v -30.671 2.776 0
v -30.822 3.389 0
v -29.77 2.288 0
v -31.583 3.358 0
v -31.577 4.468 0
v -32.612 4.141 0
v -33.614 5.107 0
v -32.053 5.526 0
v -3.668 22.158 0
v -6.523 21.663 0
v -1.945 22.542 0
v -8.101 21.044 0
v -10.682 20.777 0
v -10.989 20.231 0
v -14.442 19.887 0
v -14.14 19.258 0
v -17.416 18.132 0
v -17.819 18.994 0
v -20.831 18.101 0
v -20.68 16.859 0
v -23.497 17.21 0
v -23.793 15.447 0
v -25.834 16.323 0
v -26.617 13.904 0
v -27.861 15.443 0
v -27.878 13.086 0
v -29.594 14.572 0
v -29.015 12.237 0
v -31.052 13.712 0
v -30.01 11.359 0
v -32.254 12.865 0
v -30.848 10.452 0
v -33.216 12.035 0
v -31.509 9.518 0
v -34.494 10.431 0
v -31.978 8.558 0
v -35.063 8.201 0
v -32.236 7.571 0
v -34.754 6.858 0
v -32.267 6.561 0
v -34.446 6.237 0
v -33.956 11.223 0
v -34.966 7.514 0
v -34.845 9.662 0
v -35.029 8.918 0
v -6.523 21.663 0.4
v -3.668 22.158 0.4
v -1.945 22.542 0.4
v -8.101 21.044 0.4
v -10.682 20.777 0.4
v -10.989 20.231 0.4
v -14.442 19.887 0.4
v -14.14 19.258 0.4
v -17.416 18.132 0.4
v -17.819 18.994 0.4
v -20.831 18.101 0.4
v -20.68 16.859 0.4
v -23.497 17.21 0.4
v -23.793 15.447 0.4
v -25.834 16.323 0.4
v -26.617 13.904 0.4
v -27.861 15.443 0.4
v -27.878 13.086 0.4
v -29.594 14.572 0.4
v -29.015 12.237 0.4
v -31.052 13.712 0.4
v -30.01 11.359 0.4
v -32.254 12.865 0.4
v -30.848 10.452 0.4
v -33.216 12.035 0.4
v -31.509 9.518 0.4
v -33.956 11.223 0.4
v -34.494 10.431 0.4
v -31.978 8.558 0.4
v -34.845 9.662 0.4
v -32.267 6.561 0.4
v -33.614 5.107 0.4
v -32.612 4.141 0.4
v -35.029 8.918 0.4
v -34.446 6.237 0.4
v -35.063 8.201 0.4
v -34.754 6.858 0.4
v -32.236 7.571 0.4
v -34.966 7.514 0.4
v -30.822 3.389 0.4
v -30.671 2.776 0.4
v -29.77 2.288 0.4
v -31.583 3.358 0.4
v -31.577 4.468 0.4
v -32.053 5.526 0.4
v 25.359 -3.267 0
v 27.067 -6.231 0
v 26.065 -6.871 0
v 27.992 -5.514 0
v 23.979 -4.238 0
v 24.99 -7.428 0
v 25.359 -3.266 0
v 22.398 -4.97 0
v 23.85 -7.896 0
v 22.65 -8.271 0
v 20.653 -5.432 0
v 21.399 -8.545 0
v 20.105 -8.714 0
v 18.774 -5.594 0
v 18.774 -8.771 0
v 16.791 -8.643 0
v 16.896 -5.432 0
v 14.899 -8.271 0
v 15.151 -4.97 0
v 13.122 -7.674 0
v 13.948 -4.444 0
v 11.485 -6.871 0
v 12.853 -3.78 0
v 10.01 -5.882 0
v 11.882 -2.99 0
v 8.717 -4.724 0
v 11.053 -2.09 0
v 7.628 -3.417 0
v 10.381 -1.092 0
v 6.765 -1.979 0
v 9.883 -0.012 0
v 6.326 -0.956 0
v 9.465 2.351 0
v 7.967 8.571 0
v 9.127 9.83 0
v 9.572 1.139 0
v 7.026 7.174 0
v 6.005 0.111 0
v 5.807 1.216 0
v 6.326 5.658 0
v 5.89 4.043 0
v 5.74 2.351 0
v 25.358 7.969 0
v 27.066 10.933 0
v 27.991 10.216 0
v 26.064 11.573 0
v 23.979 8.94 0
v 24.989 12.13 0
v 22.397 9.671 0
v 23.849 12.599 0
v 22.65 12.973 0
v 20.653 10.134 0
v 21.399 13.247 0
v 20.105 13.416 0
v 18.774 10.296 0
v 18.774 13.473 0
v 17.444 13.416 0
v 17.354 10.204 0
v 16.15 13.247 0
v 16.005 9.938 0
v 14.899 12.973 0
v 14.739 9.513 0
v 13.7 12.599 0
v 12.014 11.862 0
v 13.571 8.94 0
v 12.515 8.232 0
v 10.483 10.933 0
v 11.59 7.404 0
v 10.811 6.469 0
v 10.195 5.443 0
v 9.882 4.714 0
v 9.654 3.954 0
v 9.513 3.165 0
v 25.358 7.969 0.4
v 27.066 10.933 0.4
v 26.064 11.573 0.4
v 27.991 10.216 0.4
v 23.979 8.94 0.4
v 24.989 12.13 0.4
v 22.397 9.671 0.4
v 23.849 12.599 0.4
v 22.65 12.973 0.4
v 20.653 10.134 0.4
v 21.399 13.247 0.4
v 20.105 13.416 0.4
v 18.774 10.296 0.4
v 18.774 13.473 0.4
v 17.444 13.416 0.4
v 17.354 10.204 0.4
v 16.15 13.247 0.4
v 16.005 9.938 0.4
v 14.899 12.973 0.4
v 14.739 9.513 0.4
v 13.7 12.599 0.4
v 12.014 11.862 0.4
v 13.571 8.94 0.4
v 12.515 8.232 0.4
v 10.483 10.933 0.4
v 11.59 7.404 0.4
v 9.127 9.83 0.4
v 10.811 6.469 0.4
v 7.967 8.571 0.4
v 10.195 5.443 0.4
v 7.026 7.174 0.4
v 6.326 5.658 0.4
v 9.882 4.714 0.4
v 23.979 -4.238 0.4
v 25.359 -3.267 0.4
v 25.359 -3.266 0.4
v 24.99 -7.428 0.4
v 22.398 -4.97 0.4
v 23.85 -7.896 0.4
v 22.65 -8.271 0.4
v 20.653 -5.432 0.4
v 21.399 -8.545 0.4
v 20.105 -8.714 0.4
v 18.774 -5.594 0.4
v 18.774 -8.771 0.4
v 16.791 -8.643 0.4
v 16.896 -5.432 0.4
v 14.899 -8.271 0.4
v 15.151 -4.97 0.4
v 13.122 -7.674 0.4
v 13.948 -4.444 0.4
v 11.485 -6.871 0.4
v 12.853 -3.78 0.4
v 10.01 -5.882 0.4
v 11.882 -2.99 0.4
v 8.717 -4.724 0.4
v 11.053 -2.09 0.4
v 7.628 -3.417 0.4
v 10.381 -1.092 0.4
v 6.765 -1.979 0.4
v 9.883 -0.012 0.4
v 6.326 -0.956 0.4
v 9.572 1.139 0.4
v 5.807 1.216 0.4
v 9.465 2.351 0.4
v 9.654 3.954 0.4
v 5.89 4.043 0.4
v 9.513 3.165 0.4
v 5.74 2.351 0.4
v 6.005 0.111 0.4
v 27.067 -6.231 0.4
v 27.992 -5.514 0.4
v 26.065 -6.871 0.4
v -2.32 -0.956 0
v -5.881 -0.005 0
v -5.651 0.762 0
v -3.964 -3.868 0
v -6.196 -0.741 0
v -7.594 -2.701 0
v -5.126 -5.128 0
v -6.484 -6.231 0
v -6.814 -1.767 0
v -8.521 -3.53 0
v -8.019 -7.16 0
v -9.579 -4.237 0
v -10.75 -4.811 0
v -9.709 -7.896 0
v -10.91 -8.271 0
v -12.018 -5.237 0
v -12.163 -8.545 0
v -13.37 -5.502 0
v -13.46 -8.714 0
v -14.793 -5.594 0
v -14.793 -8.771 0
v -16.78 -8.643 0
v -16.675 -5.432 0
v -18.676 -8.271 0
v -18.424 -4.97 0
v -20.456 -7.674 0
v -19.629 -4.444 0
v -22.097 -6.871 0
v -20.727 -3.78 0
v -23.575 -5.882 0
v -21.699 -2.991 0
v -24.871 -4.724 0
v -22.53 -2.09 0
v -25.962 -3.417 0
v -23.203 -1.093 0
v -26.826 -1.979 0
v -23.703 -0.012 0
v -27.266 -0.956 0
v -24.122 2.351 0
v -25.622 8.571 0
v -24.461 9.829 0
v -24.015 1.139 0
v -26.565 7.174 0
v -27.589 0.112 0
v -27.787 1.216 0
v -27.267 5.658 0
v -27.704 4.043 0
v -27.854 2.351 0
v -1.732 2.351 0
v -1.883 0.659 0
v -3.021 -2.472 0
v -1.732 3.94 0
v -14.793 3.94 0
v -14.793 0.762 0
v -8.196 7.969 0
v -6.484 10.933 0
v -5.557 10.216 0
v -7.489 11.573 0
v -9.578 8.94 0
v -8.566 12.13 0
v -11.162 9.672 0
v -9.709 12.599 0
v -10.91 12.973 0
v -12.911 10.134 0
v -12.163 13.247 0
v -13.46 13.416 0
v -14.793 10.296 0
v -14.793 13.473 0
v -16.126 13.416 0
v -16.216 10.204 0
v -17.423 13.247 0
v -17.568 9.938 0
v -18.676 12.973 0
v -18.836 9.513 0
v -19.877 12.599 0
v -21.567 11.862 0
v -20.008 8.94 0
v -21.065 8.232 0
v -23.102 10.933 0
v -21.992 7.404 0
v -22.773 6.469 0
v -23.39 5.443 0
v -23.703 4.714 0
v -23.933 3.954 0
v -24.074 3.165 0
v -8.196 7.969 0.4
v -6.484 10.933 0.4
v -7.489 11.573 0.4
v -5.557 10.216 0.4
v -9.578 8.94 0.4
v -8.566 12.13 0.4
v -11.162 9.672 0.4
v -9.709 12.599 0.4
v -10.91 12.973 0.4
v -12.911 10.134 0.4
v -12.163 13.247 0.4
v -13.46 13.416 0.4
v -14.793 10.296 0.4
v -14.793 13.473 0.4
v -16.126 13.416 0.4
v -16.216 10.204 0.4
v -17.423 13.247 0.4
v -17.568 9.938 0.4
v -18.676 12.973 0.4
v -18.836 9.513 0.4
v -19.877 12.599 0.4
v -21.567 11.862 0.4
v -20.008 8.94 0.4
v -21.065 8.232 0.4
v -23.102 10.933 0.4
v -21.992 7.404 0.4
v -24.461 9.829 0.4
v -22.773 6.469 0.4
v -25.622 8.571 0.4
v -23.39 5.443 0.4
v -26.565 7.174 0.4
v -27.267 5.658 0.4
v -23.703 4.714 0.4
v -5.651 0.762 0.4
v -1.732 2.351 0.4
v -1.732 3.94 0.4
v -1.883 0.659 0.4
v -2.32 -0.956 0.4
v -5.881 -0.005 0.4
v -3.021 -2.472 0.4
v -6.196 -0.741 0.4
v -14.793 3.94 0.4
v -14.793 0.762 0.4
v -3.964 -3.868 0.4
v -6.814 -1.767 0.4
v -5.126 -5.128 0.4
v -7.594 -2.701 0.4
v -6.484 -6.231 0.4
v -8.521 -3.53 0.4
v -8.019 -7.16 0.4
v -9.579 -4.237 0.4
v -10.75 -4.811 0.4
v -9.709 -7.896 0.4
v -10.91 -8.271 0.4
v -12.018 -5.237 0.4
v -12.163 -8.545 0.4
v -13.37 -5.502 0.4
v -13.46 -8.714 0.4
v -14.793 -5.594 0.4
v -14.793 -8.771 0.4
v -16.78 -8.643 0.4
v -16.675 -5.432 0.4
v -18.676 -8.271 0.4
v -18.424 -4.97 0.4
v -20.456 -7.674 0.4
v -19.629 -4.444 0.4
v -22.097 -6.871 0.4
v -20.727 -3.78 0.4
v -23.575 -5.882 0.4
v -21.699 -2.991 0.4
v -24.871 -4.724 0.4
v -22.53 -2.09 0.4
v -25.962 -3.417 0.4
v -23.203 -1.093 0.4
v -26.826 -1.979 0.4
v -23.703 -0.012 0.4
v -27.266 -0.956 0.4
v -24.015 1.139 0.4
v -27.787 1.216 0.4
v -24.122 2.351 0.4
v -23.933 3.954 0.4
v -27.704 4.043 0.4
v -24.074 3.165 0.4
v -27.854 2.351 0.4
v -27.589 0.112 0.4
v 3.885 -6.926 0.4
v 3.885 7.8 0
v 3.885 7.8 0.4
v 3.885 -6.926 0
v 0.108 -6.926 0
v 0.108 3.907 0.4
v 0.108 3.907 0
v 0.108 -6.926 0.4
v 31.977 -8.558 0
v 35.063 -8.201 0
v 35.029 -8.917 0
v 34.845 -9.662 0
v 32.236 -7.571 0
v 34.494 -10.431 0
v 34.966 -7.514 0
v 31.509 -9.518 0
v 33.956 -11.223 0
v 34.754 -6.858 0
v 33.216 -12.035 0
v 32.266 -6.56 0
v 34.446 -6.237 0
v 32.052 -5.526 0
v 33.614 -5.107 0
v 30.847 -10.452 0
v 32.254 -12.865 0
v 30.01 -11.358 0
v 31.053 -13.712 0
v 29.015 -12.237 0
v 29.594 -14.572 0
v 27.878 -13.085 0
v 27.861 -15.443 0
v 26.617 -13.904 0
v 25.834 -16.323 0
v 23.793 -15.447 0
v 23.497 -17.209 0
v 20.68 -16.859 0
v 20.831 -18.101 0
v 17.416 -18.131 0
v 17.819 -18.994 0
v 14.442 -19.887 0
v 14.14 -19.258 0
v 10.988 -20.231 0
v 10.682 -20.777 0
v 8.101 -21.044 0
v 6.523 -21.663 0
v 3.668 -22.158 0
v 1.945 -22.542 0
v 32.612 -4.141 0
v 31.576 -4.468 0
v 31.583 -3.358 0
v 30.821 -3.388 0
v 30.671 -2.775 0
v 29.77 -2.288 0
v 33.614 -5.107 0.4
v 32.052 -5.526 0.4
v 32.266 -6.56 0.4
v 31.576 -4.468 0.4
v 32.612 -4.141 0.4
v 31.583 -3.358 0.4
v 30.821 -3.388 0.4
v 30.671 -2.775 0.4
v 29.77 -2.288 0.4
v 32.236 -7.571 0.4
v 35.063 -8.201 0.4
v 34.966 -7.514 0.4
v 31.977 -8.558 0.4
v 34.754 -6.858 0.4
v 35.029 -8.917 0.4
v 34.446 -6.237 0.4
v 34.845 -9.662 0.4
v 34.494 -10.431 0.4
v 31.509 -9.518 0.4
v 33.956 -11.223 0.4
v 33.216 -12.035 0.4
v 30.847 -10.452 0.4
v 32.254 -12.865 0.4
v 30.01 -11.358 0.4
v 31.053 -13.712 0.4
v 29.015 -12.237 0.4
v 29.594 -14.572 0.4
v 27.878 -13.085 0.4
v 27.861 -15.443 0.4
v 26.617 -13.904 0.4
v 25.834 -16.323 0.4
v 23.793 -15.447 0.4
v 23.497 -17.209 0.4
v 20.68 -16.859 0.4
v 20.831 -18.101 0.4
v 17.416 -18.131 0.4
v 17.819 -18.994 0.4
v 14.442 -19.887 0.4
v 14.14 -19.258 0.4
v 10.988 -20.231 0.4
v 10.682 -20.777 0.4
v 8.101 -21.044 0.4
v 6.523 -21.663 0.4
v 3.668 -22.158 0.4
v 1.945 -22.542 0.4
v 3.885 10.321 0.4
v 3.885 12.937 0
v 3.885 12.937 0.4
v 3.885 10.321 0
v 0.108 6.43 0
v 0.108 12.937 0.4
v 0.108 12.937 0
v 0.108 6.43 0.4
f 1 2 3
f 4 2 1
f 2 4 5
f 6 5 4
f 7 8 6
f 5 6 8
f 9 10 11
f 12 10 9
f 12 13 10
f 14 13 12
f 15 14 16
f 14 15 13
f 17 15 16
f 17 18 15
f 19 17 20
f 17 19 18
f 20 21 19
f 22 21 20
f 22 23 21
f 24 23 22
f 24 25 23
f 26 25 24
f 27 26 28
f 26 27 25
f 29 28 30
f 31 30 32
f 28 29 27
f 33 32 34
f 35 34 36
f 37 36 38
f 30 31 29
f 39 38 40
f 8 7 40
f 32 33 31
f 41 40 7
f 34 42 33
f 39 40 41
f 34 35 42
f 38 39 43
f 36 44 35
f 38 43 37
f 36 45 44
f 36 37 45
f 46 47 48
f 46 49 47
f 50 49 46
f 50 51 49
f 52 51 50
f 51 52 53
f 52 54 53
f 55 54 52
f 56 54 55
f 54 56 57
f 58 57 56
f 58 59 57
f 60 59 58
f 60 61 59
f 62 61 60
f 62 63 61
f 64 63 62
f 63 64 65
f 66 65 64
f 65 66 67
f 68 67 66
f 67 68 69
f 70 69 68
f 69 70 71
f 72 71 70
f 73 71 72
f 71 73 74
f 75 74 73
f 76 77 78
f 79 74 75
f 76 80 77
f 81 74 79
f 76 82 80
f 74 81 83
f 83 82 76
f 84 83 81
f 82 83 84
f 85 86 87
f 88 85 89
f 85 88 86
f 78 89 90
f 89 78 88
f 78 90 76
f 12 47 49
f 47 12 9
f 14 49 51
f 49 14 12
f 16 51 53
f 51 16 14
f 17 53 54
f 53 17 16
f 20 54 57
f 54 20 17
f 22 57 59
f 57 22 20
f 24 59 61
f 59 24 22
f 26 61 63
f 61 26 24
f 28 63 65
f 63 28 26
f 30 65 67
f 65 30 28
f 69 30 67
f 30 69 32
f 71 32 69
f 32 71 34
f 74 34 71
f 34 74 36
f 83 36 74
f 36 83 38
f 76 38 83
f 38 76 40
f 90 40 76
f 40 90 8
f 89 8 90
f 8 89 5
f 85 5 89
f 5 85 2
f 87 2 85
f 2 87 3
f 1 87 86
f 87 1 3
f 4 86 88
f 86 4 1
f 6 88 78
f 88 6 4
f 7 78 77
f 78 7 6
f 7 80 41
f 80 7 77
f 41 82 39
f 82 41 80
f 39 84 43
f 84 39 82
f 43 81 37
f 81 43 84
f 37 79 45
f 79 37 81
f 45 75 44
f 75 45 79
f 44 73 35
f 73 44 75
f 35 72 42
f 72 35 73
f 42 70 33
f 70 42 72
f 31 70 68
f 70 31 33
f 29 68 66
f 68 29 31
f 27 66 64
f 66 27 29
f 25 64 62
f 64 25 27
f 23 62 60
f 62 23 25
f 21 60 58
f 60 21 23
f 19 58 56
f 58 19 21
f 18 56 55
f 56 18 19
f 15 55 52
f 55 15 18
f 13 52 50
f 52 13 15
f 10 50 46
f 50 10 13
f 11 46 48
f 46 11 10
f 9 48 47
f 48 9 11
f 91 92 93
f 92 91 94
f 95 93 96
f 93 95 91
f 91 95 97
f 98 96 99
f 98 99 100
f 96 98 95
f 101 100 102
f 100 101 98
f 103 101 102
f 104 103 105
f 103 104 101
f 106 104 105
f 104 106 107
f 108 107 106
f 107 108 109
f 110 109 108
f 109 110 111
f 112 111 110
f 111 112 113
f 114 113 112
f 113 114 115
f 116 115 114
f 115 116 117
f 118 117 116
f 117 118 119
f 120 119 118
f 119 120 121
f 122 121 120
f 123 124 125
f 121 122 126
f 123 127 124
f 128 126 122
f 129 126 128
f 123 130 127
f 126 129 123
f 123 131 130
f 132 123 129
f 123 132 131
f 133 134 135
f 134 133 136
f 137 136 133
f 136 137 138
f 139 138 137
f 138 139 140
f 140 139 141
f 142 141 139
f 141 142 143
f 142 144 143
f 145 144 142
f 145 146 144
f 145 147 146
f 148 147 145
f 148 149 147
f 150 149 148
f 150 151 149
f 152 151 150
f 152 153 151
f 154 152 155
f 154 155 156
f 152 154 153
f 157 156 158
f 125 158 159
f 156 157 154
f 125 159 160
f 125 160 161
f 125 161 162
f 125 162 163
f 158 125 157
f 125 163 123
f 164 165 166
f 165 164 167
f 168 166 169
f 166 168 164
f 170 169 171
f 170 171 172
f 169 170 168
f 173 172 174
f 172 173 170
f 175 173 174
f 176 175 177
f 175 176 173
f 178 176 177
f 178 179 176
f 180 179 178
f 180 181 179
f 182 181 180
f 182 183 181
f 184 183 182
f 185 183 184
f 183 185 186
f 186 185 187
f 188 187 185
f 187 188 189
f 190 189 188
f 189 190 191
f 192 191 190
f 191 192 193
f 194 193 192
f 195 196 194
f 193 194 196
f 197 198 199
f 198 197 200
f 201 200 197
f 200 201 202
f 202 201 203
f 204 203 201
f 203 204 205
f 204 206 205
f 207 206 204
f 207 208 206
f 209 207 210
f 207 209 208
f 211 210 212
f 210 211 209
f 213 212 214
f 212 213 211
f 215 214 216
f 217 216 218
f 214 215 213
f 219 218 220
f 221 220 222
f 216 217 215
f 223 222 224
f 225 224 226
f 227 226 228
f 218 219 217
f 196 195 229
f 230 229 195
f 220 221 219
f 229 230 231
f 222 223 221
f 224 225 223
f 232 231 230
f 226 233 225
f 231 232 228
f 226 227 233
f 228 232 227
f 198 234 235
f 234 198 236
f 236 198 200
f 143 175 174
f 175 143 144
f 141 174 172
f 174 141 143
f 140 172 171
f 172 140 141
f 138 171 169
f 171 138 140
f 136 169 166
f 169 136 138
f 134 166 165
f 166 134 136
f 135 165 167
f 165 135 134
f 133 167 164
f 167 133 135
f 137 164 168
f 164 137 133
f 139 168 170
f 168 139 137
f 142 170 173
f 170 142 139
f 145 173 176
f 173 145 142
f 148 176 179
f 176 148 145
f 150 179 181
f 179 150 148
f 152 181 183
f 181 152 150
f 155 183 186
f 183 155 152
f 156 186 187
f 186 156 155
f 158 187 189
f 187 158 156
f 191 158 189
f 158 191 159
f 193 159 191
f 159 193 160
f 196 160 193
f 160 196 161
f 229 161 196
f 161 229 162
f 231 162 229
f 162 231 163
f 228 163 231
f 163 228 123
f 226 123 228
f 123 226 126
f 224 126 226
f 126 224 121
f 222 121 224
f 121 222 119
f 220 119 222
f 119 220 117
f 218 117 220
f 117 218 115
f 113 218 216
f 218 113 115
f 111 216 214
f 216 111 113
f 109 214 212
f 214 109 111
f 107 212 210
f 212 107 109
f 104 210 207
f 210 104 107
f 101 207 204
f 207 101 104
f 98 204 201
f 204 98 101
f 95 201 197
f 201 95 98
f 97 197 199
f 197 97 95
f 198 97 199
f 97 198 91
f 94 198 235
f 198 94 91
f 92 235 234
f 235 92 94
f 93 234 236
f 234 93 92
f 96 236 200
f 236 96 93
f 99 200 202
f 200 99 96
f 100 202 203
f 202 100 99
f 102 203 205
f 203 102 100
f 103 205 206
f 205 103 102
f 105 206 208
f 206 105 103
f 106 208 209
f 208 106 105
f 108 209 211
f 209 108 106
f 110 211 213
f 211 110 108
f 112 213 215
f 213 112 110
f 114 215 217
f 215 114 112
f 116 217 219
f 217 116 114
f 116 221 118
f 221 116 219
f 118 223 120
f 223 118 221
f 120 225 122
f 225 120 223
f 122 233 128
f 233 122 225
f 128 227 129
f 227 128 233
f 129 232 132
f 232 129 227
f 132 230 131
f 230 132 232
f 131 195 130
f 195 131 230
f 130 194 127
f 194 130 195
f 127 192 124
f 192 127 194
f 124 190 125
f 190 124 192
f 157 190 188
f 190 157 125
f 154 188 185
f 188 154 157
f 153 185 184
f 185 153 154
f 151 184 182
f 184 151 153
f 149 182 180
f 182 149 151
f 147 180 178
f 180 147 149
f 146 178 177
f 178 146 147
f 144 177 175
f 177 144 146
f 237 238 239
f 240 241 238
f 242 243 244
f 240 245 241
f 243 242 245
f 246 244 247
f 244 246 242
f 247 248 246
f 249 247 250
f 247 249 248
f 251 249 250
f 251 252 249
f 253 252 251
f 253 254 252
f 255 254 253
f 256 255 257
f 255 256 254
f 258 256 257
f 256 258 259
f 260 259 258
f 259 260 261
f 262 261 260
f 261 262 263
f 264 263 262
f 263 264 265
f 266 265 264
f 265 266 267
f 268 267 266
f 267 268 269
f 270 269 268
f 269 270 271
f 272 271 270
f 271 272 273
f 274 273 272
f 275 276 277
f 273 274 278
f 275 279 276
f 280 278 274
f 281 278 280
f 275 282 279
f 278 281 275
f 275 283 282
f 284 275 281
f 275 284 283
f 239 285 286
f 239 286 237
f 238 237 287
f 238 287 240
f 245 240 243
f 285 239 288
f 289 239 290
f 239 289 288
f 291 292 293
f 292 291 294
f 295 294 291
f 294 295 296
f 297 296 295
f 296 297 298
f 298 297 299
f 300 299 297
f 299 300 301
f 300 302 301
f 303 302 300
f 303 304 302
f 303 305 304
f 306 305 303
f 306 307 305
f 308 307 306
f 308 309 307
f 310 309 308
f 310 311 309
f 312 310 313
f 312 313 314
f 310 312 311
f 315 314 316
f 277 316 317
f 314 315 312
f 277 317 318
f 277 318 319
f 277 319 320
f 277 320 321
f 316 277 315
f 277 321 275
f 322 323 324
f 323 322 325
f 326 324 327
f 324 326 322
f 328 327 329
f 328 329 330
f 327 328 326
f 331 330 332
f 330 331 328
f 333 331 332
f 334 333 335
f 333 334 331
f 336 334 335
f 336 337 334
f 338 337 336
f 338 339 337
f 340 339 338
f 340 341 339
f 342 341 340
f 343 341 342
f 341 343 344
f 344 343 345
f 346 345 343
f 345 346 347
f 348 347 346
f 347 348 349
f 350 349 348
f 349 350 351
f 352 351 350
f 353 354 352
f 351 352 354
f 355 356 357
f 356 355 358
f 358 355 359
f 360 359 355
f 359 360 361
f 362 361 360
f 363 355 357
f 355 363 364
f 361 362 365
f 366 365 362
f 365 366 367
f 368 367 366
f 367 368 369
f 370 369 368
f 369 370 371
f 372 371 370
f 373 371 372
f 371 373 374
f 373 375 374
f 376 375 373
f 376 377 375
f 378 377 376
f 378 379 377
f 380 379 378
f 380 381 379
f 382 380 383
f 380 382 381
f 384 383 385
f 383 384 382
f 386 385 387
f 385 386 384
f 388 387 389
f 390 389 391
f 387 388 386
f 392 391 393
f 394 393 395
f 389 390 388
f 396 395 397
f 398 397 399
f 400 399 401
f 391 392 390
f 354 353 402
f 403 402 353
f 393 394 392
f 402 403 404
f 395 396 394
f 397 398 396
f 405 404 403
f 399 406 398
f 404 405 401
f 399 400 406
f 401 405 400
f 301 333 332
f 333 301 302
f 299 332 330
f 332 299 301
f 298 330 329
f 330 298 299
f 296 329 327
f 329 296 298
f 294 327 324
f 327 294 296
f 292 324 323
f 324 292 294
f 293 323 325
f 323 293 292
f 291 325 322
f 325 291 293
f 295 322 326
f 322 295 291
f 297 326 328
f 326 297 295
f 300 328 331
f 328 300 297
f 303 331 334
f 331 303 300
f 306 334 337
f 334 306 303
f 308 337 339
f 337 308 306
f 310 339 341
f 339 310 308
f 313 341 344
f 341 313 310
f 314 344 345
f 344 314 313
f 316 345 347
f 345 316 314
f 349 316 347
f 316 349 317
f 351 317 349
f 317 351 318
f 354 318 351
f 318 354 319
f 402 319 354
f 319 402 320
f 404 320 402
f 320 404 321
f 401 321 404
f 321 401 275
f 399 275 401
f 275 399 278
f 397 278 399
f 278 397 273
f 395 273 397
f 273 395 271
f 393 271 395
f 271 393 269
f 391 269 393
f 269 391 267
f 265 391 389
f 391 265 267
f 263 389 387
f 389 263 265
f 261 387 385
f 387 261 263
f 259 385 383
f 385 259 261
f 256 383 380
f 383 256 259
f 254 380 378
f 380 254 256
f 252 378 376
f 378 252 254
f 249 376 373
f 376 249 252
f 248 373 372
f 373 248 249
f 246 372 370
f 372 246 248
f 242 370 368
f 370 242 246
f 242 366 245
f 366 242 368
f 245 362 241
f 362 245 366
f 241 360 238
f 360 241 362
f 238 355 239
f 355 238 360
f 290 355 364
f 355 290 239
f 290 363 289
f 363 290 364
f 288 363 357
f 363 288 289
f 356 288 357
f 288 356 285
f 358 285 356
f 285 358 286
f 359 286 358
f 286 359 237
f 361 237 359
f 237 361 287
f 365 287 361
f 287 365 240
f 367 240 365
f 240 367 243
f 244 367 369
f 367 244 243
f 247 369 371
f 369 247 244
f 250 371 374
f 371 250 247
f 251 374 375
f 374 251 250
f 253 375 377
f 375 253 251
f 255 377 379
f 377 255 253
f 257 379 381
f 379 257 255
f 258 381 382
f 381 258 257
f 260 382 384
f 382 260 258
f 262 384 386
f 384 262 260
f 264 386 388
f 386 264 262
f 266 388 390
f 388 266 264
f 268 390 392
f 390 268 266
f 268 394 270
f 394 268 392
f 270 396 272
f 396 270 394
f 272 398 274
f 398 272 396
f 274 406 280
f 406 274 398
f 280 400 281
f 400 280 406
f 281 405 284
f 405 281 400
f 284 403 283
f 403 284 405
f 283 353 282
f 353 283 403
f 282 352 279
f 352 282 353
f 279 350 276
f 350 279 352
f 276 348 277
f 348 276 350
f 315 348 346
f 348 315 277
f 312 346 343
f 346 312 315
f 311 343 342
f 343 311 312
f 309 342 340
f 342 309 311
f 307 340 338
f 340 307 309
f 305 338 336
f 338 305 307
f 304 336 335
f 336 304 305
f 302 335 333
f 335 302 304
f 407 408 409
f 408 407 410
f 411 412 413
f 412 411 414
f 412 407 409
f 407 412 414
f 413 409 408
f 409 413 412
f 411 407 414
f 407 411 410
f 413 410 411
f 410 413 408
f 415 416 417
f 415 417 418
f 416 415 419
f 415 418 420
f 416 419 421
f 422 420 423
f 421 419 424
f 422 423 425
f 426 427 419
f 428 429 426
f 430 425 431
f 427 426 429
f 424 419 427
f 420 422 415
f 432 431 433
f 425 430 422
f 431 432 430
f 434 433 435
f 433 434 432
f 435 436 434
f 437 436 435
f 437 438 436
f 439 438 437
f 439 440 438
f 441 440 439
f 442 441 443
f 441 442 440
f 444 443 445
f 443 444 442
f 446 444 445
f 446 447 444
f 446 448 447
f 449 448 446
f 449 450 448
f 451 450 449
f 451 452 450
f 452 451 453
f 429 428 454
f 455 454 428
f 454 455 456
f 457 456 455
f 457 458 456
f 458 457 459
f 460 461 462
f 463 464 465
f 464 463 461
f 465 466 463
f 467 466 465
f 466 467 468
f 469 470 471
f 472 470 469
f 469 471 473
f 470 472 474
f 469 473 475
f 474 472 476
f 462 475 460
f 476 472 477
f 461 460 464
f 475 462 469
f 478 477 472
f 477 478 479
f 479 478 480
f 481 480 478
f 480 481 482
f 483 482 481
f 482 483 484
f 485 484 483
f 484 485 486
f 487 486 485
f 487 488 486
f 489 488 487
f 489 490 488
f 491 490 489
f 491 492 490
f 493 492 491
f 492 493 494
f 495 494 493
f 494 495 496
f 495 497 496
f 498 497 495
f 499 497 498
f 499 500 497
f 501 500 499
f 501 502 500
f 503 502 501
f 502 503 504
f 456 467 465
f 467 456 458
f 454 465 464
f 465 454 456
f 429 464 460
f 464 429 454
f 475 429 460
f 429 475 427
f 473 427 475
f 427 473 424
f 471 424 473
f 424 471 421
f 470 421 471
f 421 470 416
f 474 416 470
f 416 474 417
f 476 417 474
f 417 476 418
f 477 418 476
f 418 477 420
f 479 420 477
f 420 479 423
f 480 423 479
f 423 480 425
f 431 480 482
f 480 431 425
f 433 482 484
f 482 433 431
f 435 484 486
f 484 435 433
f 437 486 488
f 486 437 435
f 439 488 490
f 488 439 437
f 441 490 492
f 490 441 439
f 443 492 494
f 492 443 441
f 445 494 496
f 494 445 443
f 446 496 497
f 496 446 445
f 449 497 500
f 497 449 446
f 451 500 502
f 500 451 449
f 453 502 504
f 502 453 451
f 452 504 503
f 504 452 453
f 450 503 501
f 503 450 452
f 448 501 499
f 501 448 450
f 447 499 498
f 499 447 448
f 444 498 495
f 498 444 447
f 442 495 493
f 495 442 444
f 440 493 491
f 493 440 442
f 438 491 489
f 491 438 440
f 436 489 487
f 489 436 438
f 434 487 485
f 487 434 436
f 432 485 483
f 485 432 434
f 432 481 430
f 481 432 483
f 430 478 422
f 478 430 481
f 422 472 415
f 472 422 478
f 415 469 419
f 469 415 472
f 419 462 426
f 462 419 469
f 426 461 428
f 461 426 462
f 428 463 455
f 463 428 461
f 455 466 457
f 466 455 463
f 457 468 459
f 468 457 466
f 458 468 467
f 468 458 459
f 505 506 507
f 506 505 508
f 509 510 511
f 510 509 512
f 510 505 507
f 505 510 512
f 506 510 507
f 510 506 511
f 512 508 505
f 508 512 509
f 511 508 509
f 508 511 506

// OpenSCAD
// Module names are of the form poly_<inkscape-path-id>().  As a result,
// you can associate a polygon in this OpenSCAD program with the corresponding
// SVG element in the Inkscape document by looking for the XML element with
// the attribute id="inkscape-path-id".

// fudge value is used to ensure that subtracted solids are a tad taller
// in the z dimension than the polygon being subtracted from.  This helps
// keep the resulting .stl file manifold.
fudge = 0.1;
height = 0.4;
line_fn = 4;
min_line_width = 1.0;
function min_line_mm(w) = max(min_line_width, w) * 90/25.4;


swoosh1_0_center = [-65.565266,-43.989188];
swoosh1_0_points = [[-105.484190,-8.106063],[-108.677771,-9.834458],[-111.908909,-11.897392],[-115.553311,-14.672762],[-119.103750,-18.095526],[-122.053001,-22.100645],[-123.143672,-24.301262],[-123.893837,-26.623077],[-124.240092,-29.057960],[-124.119033,-31.597781],[-123.467258,-34.234410],[-122.221363,-36.959717],[-120.317945,-39.765571],[-117.693601,-42.643843],[-114.284927,-45.586403],[-110.028521,-48.585119],[-104.860978,-51.631863],[-98.718897,-54.718504],[-91.538872,-57.836912],[-83.257502,-60.978956],[-73.811383,-64.136508],[-63.137112,-67.301436],[-51.171285,-70.465611],[-37.850500,-73.620902],[-23.111352,-76.759179],[-6.890440,-79.872313],[-12.995869,-78.510955],[-28.703643,-74.564031],[-38.935667,-71.685270],[-50.100986,-68.237264],[-61.710506,-64.245727],[-73.275127,-59.736375],[-84.305755,-54.734924],[-94.313291,-49.267088],[-98.780558,-46.366312],[-102.808640,-43.358583],[-106.336402,-40.247116],[-109.302705,-37.035125],[-111.646413,-33.725824],[-113.306389,-30.322428],[-114.221496,-26.828152],[-114.330596,-23.246209],[-113.572552,-19.579814],[-111.886228,-15.832182],[-109.210486,-12.006527],[-105.484190,-8.106063]];
module poly_swoosh1(h, w, s, res=line_fn)
{
  scale([25.4/90, -25.4/90, 1]) union()
  {
    translate (swoosh1_0_center) linear_extrude(height=h, convexity=10, scale=0.01*s)
      translate (-swoosh1_0_center) polygon(swoosh1_0_points);
  }
}

letraC_0_center = [59.760685,-8.330938];
letraC_0_points = [[89.855685,11.573437],[84.965529,15.015469],[79.361935,17.610937],[73.180060,19.247031],[66.521935,19.820937],[59.867717,19.247031],[53.683185,17.610937],[49.421799,15.748164],[45.542092,13.393438],[42.103244,10.596211],[39.164435,7.405937],[36.784494,3.870820],[35.017092,0.043437],[33.916486,-4.037070],[33.536935,-8.331563],[33.706740,-11.215371],[34.205373,-14.009531],[35.016662,-16.703145],[36.124435,-19.285313],[38.306623,-22.922832],[41.065373,-26.234219],[44.343967,-29.168965],[48.085685,-31.676563],[52.226525,-33.706836],[56.709904,-35.214688],[61.490236,-36.154414],[66.521935,-36.480313],[73.178498,-35.907656],[79.360685,-34.269063],[84.963498,-31.676563],[89.851935,-28.236563],[99.180685,-36.199063],[95.904709,-38.739883],[92.350998,-41.007188],[88.542756,-42.981055],[84.503185,-44.641563],[80.254846,-45.967383],[75.823342,-46.939063],[71.236447,-47.536680],[66.521935,-47.740313],[61.808537,-47.536680],[57.222873,-46.939063],[52.792365,-45.967383],[48.544435,-44.641563],[42.570920,-42.031445],[37.143498,-38.739063],[32.338107,-34.829805],[28.230685,-30.369063],[24.894943,-25.419609],[22.414435,-20.046875],[20.868615,-14.325859],[20.336935,-8.331563],[20.575471,-4.308672],[21.275842,-0.395000],[22.415197,3.386016],[23.970685,7.010937],[27.029221,12.108555],[30.887092,16.740000],[35.468010,20.840352],[40.695685,24.344687],[46.496056,27.189629],[52.792717,29.305781],[59.497424,30.624824],[66.521935,31.078437],[71.236857,30.875156],[75.824748,30.278125],[80.257482,29.306562],[84.506935,27.979687],[88.546857,26.319180],[92.354748,24.345312],[95.908107,22.078008],[99.184435,19.537187],[89.855685,11.574687],[89.855685,11.573437],[89.855685,11.573437]];
module poly_letraC(h, w, s, res=line_fn)
{
  scale([25.4/90, -25.4/90, 1]) union()
  {
    translate (letraC_0_center) linear_extrude(height=h, convexity=10, scale=0.01*s)
      translate (-letraC_0_center) polygon(letraC_0_points);
  }
}

letraG_0_center = [-52.415940,-8.331187];
letraG_0_points = [[-52.415315,-13.959313],[-52.415315,-2.700562],[-20.022815,-2.700562],[-20.838440,0.019437],[-21.954065,2.626937],[-24.142483,6.261762],[-26.908283,9.572094],[-30.194162,12.506723],[-33.942815,15.014437],[-38.091428,17.045805],[-42.584221,18.554750],[-47.374436,19.495102],[-52.415315,19.820687],[-59.085627,19.247250],[-65.281565,17.610687],[-69.552756,15.748090],[-73.441096,13.393656],[-76.887170,10.596488],[-79.831565,7.405687],[-82.216994,3.871098],[-83.988127,0.043656],[-85.091291,-4.037145],[-85.472815,-8.331813],[-85.301682,-11.215445],[-84.801252,-14.009312],[-83.988166,-16.702867],[-82.879065,-19.285563],[-80.691213,-22.922535],[-77.925627,-26.233844],[-74.640197,-29.168512],[-70.892815,-31.675563],[-66.743069,-33.706559],[-62.248908,-35.214781],[-57.457326,-36.154645],[-52.415315,-36.480563],[-45.748127,-35.907438],[-39.551565,-34.269313],[-33.939377,-31.675719],[-29.041565,-28.235563],[-19.691565,-36.199313],[-22.975764,-38.739937],[-26.537346,-41.006813],[-30.353225,-42.980250],[-34.400315,-44.640562],[-38.657619,-45.967105],[-43.097502,-46.939156],[-47.692541,-47.536910],[-52.415315,-47.740563],[-57.139670,-47.536910],[-61.735471,-46.939156],[-66.174944,-45.967105],[-70.430315,-44.640562],[-76.417346,-42.030445],[-81.855940,-38.738063],[-86.671096,-34.828805],[-90.787815,-30.368063],[-94.128498,-25.419156],[-96.613596,-20.046500],[-98.162365,-14.325563],[-98.694065,-8.331813],[-98.456291,-4.308922],[-97.754690,-0.395250],[-96.612463,3.385766],[-95.052815,7.010687],[-91.990080,12.108324],[-88.125315,16.739906],[-83.534924,20.840629],[-78.295315,24.345687],[-72.483381,27.189906],[-66.174221,29.305687],[-59.455608,30.624594],[-52.415315,31.078188],[-47.692014,30.874906],[-43.096096,30.277875],[-38.656037,29.306312],[-34.400315,27.979438],[-28.414045,25.370023],[-22.976096,22.077875],[-18.161819,18.168383],[-14.046565,13.706937],[-10.705490,8.758695],[-8.220471,3.386000],[-6.671311,-2.335914],[-6.137815,-8.331813],[-6.137815,-13.959313],[-52.415315,-13.959313],[-52.415315,-13.959313]];
module poly_letraG(h, w, s, res=line_fn)
{
  scale([25.4/90, -25.4/90, 1]) union()
  {
    translate (letraG_0_center) linear_extrude(height=h, convexity=10, scale=0.01*s)
      translate (-letraG_0_center) polygon(letraG_0_points);
  }
}

letraI_0_center = [7.073685,-1.547688];
letraI_0_points = [[0.383060,-13.845188],[0.383060,24.542312],[13.764310,24.542312],[13.764310,-27.637688],[0.383060,-13.845188],[0.383060,-13.845188]];
module poly_letraI(h, w, s, res=line_fn)
{
  scale([25.4/90, -25.4/90, 1]) union()
  {
    translate (letraI_0_center) linear_extrude(height=h, convexity=10, scale=0.01*s)
      translate (-letraI_0_center) polygon(letraI_0_points);
  }
}

swoosh2_0_center = [65.565389,43.989188];
swoosh2_0_points = [[105.483185,8.106063],[108.676872,9.834407],[111.908127,11.897285],[115.552678,14.672586],[119.103287,18.095275],[122.052722,22.100315],[123.143487,24.300894],[123.893745,26.622673],[124.240092,29.057522],[124.119123,31.597313],[123.467434,34.233914],[122.221620,36.959198],[120.318277,39.765034],[117.694001,42.643294],[114.285387,45.585847],[110.029031,48.584565],[104.861528,51.631318],[98.719474,54.717977],[91.539466,57.836411],[83.258097,60.978492],[73.811964,64.136091],[63.137663,67.301077],[51.171789,70.465322],[37.850937,73.620696],[23.111704,76.759069],[6.890685,79.872313],[12.996061,78.510904],[28.703693,74.563855],[38.935623,71.685018],[50.100837,68.236934],[61.710243,64.245323],[73.274748,59.735906],[84.305259,54.734404],[94.312682,49.266539],[98.779895,46.365757],[102.807926,43.358029],[106.335639,40.246571],[109.301896,37.034598],[111.645562,33.725324],[113.305500,30.321964],[114.220574,26.827735],[114.329645,23.245850],[113.571579,19.579525],[111.885238,15.831976],[109.209486,12.006417],[105.483185,8.106063]];
module poly_swoosh2(h, w, s, res=line_fn)
{
  scale([25.4/90, -25.4/90, 1]) union()
  {
    translate (swoosh2_0_center) linear_extrude(height=h, convexity=10, scale=0.01*s)
      translate (-swoosh2_0_center) polygon(swoosh2_0_points);
  }
}

letraIPingo_0_center = [7.073685,-34.311937];
letraIPingo_0_points = [[0.383060,-22.784438],[13.764310,-36.570688],[13.764310,-45.839438],[0.383060,-45.839438],[0.383060,-22.784438],[0.383060,-22.784438]];
module poly_letraIPingo(h, w, s, res=line_fn)
{
  scale([25.4/90, -25.4/90, 1]) union()
  {
    translate (letraIPingo_0_center) linear_extrude(height=h, convexity=10, scale=0.01*s)
      translate (-letraIPingo_0_center) polygon(letraIPingo_0_points);
  }
}

module inkscape(h)
{
  difference()
  {
    union()
    {
      translate ([0,0,0]) poly_swoosh1(h, min_line_mm(1.0), 100.0);
      translate ([0,0,0]) poly_letraC(h, min_line_mm(1.0), 100.0);
      translate ([0,0,0]) poly_letraG(h, min_line_mm(1.0), 100.0);
      translate ([0,0,0]) poly_letraI(h, min_line_mm(1.0), 100.0);
      translate ([0,0,0]) poly_swoosh2(h, min_line_mm(1.0), 100.0);
      translate ([0,0,0]) poly_letraIPingo(h, min_line_mm(1.0), 100.0);
    }
    union()
    {
    }
  }
}

inkscape(height);
